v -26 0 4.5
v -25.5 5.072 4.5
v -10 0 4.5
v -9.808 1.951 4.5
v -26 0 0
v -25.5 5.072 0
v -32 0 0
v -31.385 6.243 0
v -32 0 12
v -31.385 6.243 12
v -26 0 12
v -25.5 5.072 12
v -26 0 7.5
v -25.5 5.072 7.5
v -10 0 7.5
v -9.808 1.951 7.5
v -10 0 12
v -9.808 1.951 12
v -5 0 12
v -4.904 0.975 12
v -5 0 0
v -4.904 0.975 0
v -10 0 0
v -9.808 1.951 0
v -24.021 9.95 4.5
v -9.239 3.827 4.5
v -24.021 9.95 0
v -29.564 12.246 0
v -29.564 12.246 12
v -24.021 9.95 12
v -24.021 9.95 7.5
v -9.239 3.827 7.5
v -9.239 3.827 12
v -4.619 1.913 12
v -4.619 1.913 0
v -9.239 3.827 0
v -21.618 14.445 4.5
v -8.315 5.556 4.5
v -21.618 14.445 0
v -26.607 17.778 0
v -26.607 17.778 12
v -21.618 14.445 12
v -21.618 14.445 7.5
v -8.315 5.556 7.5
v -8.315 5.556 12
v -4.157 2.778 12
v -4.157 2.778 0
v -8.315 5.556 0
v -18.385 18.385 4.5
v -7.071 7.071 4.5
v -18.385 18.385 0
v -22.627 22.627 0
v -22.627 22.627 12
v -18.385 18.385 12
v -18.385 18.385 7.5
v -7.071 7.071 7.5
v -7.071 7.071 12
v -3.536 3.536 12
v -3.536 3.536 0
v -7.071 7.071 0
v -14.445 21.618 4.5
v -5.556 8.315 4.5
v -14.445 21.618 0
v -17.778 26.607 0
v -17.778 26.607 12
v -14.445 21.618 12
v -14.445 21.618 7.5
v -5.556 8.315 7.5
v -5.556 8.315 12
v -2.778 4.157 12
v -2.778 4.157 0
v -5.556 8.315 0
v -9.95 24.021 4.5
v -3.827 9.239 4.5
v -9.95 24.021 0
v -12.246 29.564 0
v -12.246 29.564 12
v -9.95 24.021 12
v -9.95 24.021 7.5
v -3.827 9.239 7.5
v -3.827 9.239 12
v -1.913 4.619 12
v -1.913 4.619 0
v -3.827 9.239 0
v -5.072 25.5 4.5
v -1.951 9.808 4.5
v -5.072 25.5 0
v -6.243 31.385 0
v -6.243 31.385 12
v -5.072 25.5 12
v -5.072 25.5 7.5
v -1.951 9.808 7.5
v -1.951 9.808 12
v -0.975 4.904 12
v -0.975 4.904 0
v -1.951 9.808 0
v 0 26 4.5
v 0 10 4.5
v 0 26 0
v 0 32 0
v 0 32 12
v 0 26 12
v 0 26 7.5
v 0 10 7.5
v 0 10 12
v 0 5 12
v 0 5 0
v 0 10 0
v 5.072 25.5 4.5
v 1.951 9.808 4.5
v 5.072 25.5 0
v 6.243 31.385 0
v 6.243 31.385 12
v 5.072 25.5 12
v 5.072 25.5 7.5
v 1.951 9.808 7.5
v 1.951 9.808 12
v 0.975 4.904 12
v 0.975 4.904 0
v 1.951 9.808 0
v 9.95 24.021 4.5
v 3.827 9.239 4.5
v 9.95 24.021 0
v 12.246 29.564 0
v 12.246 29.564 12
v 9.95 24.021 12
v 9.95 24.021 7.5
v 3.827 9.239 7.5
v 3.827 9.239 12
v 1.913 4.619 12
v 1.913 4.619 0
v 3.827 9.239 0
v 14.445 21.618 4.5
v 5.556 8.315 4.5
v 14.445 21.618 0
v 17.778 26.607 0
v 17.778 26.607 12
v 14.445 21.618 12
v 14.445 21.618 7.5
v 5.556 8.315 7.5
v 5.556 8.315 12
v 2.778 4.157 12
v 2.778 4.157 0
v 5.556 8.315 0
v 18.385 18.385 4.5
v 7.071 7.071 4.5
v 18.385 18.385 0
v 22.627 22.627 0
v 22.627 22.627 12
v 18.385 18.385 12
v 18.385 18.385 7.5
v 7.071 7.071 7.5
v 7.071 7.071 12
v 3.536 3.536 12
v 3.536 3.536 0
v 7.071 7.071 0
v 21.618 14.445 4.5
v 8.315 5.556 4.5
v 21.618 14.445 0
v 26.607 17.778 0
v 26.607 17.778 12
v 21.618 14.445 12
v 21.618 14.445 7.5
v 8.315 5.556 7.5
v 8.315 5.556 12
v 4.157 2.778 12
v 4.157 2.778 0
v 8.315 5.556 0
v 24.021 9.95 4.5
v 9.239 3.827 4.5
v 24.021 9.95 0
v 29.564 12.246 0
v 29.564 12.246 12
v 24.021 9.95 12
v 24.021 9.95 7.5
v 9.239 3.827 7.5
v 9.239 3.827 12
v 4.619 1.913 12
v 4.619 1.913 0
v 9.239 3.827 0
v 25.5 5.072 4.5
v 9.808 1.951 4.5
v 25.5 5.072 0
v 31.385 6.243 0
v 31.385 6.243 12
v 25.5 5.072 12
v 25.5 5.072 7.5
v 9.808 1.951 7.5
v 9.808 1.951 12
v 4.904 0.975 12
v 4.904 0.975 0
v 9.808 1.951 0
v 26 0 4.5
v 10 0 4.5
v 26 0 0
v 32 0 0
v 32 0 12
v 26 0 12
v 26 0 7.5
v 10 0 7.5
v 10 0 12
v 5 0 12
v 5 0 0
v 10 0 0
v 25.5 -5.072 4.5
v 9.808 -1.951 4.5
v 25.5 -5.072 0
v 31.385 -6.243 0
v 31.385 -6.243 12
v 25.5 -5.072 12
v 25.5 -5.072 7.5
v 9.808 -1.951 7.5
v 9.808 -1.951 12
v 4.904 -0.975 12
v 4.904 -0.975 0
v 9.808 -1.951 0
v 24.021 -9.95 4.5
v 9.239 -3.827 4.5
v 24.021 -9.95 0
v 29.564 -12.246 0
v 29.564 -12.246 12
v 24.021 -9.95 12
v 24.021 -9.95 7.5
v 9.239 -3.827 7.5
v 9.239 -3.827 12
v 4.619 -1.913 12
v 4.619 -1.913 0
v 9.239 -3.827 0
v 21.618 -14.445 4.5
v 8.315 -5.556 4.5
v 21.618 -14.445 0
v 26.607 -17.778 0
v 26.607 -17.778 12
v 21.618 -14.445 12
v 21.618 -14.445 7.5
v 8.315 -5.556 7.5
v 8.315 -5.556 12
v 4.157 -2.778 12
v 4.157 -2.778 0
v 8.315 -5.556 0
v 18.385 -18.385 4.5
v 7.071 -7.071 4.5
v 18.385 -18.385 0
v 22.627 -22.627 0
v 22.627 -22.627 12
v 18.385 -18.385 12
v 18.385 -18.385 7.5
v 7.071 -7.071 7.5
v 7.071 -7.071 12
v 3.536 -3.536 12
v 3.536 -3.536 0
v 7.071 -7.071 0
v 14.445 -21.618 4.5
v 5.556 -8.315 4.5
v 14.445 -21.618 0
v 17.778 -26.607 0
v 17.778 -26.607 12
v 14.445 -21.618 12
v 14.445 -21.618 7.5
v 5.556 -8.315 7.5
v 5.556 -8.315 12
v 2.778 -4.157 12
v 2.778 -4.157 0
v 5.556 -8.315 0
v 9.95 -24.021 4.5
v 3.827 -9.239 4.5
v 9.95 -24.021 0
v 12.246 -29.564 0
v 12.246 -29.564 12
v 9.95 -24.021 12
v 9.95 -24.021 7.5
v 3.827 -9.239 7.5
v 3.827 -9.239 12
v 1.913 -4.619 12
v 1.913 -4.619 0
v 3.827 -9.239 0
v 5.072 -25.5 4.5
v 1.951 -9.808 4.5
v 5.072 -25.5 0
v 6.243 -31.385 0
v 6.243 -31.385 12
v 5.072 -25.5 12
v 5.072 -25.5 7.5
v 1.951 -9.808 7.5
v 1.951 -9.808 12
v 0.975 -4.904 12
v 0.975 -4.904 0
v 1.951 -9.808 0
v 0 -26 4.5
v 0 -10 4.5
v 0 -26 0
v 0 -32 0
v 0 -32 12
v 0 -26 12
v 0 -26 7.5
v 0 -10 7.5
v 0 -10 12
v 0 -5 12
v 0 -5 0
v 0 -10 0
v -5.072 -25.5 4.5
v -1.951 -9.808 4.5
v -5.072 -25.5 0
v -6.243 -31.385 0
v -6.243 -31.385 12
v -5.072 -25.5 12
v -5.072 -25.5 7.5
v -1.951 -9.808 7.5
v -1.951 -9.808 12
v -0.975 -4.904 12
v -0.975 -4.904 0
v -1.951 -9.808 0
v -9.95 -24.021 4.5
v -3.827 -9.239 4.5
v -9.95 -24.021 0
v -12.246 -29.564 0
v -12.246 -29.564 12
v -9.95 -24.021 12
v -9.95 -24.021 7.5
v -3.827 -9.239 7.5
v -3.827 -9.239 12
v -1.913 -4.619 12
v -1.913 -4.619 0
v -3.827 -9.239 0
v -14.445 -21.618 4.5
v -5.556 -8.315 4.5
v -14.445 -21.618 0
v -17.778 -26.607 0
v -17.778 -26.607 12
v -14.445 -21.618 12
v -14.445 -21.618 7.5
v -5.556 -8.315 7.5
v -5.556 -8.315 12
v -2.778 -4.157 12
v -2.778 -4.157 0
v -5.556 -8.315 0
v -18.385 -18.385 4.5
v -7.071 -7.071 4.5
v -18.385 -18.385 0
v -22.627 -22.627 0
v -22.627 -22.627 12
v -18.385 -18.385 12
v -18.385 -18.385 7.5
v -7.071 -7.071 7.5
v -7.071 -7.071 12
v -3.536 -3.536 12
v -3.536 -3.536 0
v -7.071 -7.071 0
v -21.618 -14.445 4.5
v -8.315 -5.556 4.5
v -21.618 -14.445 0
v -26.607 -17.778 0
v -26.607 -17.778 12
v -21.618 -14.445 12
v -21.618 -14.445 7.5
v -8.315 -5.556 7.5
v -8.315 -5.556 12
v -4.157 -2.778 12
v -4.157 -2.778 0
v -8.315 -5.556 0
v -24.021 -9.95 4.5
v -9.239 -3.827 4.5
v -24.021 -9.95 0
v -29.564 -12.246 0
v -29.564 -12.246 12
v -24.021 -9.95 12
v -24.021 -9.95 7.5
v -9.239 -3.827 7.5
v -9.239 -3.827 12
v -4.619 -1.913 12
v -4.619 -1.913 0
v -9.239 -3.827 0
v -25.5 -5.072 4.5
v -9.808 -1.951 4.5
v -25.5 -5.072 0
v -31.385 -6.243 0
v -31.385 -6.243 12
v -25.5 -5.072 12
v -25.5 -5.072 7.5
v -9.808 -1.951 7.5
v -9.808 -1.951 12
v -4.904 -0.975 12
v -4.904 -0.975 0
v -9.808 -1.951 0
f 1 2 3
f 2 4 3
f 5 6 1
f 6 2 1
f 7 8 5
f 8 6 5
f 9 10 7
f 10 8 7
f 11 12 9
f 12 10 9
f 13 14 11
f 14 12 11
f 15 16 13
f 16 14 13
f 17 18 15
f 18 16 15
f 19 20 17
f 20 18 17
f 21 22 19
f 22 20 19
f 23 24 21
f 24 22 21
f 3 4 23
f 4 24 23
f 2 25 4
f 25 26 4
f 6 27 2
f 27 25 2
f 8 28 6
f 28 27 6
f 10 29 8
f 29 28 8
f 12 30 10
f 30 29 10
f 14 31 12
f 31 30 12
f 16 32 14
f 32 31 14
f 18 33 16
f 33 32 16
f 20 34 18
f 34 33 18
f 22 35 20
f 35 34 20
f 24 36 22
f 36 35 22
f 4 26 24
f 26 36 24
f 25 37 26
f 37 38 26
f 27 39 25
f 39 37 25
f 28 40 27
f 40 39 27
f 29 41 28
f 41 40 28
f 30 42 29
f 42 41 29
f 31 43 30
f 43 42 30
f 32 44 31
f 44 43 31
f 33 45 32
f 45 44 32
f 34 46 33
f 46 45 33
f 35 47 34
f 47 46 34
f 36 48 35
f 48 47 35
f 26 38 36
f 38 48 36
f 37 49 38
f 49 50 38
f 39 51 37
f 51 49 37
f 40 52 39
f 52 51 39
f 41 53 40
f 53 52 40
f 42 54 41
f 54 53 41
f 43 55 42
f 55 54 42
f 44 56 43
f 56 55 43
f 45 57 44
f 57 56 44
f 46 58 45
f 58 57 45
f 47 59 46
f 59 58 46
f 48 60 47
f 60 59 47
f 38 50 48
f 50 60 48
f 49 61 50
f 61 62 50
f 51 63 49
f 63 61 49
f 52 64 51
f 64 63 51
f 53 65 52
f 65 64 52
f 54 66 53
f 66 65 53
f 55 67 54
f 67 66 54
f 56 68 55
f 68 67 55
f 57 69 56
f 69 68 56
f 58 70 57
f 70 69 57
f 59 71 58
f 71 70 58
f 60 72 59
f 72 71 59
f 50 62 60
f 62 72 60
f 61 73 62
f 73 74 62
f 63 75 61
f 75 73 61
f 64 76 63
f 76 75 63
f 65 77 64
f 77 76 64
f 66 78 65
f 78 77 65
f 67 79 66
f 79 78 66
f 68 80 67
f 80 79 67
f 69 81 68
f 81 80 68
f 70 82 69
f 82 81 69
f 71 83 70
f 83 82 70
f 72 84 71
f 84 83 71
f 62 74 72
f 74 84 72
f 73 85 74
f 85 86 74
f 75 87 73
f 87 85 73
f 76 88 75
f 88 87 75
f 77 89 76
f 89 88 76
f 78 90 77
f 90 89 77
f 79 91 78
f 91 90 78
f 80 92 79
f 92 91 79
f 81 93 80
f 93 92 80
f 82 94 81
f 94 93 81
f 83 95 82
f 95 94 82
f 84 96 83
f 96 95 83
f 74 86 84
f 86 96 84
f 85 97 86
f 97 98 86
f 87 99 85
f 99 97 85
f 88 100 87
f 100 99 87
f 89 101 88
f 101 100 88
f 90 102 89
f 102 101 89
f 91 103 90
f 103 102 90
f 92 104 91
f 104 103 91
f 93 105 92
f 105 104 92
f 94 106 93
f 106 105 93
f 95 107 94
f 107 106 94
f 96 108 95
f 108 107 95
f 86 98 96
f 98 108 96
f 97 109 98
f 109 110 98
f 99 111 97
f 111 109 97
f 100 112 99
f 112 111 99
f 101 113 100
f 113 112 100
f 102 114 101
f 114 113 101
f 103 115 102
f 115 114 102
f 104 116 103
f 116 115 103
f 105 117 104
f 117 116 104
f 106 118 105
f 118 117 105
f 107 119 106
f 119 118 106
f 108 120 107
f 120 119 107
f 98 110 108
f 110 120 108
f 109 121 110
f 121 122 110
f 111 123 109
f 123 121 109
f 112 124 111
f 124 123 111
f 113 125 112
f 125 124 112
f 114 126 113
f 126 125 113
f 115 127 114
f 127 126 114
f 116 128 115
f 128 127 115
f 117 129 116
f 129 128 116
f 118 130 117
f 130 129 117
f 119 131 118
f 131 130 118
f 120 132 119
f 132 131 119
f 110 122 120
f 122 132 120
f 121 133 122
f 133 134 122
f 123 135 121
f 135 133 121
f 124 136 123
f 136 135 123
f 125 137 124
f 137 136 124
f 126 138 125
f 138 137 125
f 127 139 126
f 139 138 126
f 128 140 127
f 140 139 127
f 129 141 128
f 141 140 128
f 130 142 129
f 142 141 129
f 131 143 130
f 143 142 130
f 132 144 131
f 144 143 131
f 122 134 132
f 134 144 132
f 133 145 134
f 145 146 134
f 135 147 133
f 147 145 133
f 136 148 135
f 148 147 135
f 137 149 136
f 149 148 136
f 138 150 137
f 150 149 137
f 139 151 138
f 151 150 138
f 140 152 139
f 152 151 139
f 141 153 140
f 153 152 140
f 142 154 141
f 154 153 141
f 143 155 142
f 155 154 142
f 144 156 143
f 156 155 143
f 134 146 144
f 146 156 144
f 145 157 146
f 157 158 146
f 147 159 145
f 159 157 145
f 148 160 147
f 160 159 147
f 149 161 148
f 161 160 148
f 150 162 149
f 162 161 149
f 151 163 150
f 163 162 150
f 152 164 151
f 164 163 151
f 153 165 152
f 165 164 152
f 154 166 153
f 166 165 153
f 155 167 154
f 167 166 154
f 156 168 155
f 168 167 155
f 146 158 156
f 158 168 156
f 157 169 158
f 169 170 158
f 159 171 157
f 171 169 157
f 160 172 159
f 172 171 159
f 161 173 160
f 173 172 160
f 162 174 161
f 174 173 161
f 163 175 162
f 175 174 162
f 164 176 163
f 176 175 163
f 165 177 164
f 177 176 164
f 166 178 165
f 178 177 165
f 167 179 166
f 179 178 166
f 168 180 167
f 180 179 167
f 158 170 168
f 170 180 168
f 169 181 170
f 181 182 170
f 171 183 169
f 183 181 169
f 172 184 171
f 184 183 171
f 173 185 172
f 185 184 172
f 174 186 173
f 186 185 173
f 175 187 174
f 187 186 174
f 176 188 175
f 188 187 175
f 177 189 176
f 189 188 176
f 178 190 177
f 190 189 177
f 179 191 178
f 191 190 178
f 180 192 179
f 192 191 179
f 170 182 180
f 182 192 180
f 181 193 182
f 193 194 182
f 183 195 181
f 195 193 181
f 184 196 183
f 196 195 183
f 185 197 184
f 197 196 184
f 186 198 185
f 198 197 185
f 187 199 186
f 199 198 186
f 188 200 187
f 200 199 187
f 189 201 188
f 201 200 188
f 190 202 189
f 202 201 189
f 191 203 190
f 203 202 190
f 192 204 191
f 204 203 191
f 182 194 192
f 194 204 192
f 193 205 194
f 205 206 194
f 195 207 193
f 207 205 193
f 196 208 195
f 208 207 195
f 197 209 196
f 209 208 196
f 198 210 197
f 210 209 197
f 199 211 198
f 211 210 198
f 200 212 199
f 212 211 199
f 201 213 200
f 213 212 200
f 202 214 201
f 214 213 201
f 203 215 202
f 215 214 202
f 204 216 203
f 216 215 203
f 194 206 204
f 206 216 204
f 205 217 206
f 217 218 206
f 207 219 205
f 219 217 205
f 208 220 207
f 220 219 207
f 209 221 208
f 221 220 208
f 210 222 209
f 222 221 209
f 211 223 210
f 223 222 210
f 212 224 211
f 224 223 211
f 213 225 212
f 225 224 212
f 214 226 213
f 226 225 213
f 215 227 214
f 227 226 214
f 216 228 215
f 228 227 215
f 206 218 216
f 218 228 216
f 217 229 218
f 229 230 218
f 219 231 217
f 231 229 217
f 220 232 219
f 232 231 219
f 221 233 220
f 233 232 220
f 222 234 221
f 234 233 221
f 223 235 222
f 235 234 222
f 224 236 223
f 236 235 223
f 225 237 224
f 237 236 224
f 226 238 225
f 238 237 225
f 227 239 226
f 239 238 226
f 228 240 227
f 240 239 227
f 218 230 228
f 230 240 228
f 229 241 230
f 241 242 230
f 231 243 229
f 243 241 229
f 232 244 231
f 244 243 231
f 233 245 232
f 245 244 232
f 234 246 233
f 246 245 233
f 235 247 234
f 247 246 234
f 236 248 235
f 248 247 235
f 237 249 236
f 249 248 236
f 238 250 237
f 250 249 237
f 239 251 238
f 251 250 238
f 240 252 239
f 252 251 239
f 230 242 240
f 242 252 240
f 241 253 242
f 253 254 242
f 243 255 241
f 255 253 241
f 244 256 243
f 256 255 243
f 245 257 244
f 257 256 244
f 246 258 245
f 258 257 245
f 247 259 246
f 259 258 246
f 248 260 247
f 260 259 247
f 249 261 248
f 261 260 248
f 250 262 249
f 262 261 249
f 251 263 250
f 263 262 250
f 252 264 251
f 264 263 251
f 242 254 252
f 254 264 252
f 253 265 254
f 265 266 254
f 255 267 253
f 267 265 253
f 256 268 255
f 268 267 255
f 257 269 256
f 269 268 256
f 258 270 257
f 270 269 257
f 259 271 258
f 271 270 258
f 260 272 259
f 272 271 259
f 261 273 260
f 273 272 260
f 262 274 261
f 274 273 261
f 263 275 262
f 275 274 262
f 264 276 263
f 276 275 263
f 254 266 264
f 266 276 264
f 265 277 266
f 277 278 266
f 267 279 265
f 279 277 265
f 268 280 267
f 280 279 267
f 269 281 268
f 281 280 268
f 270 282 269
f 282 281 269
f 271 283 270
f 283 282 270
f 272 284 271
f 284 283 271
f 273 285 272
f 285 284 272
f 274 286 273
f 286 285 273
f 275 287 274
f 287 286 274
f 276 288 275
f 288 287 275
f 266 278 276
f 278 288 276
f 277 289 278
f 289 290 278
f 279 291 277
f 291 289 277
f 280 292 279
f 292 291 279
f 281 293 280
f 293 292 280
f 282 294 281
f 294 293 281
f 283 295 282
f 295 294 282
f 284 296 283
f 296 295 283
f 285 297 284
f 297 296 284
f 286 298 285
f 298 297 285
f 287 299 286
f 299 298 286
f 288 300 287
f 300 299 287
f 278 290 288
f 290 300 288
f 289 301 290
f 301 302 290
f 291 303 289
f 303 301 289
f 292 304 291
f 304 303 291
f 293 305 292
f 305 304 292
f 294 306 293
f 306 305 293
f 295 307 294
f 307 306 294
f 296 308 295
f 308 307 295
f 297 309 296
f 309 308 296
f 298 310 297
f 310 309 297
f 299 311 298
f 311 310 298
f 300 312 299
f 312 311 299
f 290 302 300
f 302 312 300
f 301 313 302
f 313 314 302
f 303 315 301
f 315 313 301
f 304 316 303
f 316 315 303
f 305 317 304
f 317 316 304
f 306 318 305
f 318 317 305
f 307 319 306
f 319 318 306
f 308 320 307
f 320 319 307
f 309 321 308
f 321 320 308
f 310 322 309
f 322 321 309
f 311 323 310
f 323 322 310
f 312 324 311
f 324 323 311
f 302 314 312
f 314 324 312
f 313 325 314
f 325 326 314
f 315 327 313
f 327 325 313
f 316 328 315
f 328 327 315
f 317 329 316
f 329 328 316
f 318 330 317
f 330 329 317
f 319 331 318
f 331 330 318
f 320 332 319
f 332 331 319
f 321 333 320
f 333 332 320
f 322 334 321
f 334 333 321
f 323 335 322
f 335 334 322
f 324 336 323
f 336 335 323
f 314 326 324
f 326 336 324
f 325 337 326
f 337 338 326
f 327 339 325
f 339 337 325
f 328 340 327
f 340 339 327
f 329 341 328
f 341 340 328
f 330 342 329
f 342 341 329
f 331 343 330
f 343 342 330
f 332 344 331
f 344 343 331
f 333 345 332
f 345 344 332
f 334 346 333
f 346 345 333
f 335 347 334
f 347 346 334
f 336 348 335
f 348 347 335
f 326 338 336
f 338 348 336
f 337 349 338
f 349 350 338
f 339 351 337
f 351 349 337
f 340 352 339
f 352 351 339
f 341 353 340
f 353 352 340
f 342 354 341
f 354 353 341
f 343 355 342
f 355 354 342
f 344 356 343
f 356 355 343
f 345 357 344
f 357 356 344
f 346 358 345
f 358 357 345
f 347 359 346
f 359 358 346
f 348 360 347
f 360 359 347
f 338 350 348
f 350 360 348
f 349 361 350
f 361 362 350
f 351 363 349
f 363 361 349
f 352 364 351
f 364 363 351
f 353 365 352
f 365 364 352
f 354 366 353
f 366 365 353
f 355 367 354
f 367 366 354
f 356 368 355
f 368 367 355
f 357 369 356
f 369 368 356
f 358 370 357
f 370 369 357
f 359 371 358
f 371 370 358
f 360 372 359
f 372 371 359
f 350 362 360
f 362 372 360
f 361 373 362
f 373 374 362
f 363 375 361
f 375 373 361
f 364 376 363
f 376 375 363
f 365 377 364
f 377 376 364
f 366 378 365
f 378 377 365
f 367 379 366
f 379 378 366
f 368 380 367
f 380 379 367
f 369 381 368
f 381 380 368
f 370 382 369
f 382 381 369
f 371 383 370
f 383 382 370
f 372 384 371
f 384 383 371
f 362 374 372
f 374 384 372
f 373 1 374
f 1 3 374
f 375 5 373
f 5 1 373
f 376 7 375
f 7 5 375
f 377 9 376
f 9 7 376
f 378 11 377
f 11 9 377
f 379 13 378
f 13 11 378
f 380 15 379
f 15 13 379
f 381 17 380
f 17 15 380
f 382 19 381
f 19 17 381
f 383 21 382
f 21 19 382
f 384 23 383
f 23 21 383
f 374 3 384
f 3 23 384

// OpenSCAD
$fn = 32;

// ----------------------------------------------------------------------
// Revolved part: handwheel R32
// ----------------------------------------------------------------------

// --- parameters (mm) ---
bore_r = 5;               // bore radius
rim_r = 32;               // rim radius
rim_w = 6;                // rim axial width
rim_t = 12;               // rim diameter height
hub_r = 10;               // hub radius
web_t = 3;                // web thickness
revolve_angle = 360;      // revolve sweep, degrees

bore_d = 2 * bore_r;
rim_d = 2 * rim_r;
hub_d = 2 * hub_r;

profile = [[5, 0], [10, 0], [10, 4.5], [26, 4.5], [26, 0], [32, 0], [32, 12], [26, 12], [26, 7.5], [10, 7.5], [10, 12], [5, 12]];  // primary outline, 12 points, counter clockwise

// --- the one profile operation ---
rotate_extrude(angle = revolve_angle) polygon(points = profile);
